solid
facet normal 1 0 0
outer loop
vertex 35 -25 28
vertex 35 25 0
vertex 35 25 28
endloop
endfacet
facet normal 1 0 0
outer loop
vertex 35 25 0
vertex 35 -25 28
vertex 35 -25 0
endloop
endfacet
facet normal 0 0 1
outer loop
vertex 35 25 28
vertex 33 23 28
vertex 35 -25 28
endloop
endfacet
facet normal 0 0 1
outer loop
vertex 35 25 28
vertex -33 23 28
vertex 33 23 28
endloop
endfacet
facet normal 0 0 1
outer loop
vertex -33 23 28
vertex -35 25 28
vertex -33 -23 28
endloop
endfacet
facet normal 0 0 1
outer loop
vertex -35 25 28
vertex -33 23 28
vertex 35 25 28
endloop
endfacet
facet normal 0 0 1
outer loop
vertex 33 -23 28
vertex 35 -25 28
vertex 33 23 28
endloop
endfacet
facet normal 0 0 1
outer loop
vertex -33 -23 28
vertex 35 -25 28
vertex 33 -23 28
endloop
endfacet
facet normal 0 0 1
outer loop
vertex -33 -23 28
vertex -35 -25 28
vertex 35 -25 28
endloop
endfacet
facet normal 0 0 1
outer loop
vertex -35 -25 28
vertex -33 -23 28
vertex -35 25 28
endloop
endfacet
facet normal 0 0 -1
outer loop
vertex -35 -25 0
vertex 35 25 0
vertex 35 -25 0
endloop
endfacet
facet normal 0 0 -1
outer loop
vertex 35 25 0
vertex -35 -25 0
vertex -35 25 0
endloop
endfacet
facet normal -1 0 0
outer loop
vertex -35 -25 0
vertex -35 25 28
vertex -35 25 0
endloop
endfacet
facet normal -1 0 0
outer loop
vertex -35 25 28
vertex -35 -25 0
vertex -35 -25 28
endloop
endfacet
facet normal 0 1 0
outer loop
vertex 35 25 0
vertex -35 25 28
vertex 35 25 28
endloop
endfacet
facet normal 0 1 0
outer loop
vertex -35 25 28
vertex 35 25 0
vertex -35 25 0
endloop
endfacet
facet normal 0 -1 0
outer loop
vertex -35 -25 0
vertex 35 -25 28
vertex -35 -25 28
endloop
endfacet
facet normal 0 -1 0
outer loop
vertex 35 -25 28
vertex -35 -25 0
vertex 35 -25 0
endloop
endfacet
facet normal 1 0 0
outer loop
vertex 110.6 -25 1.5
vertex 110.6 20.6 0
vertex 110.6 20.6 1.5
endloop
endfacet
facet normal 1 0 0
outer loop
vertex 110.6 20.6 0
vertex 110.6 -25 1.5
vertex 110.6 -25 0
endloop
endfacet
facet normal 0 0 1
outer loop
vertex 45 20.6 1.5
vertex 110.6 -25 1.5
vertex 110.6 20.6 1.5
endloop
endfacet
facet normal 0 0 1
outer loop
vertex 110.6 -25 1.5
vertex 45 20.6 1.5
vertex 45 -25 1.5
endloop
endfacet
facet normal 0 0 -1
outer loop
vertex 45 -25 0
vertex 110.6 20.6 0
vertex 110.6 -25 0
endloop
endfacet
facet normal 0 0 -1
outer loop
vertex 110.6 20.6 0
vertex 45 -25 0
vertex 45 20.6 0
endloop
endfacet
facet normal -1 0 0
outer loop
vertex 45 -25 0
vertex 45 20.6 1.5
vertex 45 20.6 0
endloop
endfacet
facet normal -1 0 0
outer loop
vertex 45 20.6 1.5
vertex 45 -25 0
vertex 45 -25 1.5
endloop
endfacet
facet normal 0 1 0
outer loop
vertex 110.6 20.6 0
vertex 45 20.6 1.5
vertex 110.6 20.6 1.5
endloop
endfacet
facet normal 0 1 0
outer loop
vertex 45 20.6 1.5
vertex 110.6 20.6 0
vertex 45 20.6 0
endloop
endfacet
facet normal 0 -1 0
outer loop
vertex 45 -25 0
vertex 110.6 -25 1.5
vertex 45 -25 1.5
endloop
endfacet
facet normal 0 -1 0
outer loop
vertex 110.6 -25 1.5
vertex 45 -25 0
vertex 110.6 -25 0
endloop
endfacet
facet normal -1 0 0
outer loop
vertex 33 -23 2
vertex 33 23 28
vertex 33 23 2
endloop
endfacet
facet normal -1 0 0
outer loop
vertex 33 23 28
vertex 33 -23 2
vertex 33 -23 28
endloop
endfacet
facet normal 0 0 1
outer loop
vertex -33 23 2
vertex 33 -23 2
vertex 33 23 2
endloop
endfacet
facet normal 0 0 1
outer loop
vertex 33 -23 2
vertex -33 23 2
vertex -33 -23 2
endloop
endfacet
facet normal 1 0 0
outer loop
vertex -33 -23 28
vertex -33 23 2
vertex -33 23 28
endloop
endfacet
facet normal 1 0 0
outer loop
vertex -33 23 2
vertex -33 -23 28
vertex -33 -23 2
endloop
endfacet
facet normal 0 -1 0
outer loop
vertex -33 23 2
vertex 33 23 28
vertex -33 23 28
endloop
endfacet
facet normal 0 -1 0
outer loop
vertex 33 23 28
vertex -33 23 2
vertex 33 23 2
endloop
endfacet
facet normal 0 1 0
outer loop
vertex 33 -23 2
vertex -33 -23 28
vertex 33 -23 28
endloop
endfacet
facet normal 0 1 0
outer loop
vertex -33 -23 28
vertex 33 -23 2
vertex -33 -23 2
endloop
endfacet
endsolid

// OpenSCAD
// Two-part enclosure for small electronics board
// Print orientation: both parts flat on bed, lid on +X side of box

// ---- Box ----
box_x = 70;      // outer length (X)
box_y = 50;      // outer width (Y)
box_z = 30;      // outer height (Z)
wall = 2;        // side wall thickness
floor = 2;       // floor thickness

// ---- Lid ----
lip_w = 65.6;    // lip outer length (X)
lip_d = 45.6;    // lip outer width (Y)
lip_h = 1.5;     // lip height (wall thickness)
eps = 0.2;       // clearance between lip and box opening

// ---- Misc ----
gap = 10;        // gap between parts on bed
overlap = 0.01;  // small overlap so lid sits in box in union

$fn = 64;

difference() {
    union() {
        // Box (open top)
        translate([-box_x/2, -box_y/2, 0])
            cube([box_x, box_y, box_z - wall]);
        // Lid (printed upside down, resting on bed)
        translate([box_x/2 + gap, -box_y/2, 0])
            cube([lip_w, lip_d, lip_h]);
    }
    // Cut the open-top cavity
    translate([-box_x/2 + wall, -box_y/2 + wall, floor])
        cube([box_x - 2*wall, box_y - 2*wall, box_z - wall + overlap]);
}
